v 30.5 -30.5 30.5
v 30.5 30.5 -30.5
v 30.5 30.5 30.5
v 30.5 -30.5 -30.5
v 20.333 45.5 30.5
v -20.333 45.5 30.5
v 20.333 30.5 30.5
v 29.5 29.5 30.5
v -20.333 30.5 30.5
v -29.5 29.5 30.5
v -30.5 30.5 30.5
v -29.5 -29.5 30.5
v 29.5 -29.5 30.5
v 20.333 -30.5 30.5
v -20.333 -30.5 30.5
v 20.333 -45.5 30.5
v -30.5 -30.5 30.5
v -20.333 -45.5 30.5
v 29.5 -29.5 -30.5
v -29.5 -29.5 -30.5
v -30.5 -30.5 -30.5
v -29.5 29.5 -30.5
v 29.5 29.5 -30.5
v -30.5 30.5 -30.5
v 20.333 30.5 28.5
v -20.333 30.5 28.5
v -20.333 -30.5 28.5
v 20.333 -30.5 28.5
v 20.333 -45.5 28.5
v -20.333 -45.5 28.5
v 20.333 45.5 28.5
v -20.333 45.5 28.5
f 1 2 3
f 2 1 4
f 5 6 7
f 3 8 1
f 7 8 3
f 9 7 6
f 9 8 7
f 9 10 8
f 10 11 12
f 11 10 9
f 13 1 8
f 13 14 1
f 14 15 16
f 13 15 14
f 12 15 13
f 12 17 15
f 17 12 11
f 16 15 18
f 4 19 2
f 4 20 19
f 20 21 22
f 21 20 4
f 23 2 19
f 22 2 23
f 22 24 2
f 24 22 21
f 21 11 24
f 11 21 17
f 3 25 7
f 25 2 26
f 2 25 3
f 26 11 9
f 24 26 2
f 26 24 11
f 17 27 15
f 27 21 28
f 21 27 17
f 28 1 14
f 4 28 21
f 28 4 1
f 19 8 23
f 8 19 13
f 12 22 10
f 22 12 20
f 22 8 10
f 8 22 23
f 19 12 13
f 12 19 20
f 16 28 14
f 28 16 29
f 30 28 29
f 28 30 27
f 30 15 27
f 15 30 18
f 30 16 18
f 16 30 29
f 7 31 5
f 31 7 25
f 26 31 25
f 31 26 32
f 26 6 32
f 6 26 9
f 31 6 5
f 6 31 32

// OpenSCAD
// [FL_INDEX: keywords="openscad, 3d_parametric, Portion_Size_Box, csg_solid" | COT="Parametric OpenSCAD design from 3DCodeverse"]
// Title: Portion Size Box

container_size_dimension=61;//[10:100]
container_size_z=61;//[13:100]
serving();
module serving(){

container_x=container_size_dimension;
container_y=container_size_dimension;
container_z= container_size_z;
handle_x=2*container_x/3;
handle_y=15;
handle_z=2;

difference(){
	cube([container_x,container_y,container_z], center=true);
	
	cube([container_x-2,container_x-2,container_z+1], center=true);
}
translate([0,-container_y/2-handle_y/2,container_z/2-1])
cube([handle_x,handle_y,handle_z], center=true);
translate([0,container_y/2+handle_y/2,container_z/2-1])
cube([handle_x,handle_y,handle_z], center=true);
}
